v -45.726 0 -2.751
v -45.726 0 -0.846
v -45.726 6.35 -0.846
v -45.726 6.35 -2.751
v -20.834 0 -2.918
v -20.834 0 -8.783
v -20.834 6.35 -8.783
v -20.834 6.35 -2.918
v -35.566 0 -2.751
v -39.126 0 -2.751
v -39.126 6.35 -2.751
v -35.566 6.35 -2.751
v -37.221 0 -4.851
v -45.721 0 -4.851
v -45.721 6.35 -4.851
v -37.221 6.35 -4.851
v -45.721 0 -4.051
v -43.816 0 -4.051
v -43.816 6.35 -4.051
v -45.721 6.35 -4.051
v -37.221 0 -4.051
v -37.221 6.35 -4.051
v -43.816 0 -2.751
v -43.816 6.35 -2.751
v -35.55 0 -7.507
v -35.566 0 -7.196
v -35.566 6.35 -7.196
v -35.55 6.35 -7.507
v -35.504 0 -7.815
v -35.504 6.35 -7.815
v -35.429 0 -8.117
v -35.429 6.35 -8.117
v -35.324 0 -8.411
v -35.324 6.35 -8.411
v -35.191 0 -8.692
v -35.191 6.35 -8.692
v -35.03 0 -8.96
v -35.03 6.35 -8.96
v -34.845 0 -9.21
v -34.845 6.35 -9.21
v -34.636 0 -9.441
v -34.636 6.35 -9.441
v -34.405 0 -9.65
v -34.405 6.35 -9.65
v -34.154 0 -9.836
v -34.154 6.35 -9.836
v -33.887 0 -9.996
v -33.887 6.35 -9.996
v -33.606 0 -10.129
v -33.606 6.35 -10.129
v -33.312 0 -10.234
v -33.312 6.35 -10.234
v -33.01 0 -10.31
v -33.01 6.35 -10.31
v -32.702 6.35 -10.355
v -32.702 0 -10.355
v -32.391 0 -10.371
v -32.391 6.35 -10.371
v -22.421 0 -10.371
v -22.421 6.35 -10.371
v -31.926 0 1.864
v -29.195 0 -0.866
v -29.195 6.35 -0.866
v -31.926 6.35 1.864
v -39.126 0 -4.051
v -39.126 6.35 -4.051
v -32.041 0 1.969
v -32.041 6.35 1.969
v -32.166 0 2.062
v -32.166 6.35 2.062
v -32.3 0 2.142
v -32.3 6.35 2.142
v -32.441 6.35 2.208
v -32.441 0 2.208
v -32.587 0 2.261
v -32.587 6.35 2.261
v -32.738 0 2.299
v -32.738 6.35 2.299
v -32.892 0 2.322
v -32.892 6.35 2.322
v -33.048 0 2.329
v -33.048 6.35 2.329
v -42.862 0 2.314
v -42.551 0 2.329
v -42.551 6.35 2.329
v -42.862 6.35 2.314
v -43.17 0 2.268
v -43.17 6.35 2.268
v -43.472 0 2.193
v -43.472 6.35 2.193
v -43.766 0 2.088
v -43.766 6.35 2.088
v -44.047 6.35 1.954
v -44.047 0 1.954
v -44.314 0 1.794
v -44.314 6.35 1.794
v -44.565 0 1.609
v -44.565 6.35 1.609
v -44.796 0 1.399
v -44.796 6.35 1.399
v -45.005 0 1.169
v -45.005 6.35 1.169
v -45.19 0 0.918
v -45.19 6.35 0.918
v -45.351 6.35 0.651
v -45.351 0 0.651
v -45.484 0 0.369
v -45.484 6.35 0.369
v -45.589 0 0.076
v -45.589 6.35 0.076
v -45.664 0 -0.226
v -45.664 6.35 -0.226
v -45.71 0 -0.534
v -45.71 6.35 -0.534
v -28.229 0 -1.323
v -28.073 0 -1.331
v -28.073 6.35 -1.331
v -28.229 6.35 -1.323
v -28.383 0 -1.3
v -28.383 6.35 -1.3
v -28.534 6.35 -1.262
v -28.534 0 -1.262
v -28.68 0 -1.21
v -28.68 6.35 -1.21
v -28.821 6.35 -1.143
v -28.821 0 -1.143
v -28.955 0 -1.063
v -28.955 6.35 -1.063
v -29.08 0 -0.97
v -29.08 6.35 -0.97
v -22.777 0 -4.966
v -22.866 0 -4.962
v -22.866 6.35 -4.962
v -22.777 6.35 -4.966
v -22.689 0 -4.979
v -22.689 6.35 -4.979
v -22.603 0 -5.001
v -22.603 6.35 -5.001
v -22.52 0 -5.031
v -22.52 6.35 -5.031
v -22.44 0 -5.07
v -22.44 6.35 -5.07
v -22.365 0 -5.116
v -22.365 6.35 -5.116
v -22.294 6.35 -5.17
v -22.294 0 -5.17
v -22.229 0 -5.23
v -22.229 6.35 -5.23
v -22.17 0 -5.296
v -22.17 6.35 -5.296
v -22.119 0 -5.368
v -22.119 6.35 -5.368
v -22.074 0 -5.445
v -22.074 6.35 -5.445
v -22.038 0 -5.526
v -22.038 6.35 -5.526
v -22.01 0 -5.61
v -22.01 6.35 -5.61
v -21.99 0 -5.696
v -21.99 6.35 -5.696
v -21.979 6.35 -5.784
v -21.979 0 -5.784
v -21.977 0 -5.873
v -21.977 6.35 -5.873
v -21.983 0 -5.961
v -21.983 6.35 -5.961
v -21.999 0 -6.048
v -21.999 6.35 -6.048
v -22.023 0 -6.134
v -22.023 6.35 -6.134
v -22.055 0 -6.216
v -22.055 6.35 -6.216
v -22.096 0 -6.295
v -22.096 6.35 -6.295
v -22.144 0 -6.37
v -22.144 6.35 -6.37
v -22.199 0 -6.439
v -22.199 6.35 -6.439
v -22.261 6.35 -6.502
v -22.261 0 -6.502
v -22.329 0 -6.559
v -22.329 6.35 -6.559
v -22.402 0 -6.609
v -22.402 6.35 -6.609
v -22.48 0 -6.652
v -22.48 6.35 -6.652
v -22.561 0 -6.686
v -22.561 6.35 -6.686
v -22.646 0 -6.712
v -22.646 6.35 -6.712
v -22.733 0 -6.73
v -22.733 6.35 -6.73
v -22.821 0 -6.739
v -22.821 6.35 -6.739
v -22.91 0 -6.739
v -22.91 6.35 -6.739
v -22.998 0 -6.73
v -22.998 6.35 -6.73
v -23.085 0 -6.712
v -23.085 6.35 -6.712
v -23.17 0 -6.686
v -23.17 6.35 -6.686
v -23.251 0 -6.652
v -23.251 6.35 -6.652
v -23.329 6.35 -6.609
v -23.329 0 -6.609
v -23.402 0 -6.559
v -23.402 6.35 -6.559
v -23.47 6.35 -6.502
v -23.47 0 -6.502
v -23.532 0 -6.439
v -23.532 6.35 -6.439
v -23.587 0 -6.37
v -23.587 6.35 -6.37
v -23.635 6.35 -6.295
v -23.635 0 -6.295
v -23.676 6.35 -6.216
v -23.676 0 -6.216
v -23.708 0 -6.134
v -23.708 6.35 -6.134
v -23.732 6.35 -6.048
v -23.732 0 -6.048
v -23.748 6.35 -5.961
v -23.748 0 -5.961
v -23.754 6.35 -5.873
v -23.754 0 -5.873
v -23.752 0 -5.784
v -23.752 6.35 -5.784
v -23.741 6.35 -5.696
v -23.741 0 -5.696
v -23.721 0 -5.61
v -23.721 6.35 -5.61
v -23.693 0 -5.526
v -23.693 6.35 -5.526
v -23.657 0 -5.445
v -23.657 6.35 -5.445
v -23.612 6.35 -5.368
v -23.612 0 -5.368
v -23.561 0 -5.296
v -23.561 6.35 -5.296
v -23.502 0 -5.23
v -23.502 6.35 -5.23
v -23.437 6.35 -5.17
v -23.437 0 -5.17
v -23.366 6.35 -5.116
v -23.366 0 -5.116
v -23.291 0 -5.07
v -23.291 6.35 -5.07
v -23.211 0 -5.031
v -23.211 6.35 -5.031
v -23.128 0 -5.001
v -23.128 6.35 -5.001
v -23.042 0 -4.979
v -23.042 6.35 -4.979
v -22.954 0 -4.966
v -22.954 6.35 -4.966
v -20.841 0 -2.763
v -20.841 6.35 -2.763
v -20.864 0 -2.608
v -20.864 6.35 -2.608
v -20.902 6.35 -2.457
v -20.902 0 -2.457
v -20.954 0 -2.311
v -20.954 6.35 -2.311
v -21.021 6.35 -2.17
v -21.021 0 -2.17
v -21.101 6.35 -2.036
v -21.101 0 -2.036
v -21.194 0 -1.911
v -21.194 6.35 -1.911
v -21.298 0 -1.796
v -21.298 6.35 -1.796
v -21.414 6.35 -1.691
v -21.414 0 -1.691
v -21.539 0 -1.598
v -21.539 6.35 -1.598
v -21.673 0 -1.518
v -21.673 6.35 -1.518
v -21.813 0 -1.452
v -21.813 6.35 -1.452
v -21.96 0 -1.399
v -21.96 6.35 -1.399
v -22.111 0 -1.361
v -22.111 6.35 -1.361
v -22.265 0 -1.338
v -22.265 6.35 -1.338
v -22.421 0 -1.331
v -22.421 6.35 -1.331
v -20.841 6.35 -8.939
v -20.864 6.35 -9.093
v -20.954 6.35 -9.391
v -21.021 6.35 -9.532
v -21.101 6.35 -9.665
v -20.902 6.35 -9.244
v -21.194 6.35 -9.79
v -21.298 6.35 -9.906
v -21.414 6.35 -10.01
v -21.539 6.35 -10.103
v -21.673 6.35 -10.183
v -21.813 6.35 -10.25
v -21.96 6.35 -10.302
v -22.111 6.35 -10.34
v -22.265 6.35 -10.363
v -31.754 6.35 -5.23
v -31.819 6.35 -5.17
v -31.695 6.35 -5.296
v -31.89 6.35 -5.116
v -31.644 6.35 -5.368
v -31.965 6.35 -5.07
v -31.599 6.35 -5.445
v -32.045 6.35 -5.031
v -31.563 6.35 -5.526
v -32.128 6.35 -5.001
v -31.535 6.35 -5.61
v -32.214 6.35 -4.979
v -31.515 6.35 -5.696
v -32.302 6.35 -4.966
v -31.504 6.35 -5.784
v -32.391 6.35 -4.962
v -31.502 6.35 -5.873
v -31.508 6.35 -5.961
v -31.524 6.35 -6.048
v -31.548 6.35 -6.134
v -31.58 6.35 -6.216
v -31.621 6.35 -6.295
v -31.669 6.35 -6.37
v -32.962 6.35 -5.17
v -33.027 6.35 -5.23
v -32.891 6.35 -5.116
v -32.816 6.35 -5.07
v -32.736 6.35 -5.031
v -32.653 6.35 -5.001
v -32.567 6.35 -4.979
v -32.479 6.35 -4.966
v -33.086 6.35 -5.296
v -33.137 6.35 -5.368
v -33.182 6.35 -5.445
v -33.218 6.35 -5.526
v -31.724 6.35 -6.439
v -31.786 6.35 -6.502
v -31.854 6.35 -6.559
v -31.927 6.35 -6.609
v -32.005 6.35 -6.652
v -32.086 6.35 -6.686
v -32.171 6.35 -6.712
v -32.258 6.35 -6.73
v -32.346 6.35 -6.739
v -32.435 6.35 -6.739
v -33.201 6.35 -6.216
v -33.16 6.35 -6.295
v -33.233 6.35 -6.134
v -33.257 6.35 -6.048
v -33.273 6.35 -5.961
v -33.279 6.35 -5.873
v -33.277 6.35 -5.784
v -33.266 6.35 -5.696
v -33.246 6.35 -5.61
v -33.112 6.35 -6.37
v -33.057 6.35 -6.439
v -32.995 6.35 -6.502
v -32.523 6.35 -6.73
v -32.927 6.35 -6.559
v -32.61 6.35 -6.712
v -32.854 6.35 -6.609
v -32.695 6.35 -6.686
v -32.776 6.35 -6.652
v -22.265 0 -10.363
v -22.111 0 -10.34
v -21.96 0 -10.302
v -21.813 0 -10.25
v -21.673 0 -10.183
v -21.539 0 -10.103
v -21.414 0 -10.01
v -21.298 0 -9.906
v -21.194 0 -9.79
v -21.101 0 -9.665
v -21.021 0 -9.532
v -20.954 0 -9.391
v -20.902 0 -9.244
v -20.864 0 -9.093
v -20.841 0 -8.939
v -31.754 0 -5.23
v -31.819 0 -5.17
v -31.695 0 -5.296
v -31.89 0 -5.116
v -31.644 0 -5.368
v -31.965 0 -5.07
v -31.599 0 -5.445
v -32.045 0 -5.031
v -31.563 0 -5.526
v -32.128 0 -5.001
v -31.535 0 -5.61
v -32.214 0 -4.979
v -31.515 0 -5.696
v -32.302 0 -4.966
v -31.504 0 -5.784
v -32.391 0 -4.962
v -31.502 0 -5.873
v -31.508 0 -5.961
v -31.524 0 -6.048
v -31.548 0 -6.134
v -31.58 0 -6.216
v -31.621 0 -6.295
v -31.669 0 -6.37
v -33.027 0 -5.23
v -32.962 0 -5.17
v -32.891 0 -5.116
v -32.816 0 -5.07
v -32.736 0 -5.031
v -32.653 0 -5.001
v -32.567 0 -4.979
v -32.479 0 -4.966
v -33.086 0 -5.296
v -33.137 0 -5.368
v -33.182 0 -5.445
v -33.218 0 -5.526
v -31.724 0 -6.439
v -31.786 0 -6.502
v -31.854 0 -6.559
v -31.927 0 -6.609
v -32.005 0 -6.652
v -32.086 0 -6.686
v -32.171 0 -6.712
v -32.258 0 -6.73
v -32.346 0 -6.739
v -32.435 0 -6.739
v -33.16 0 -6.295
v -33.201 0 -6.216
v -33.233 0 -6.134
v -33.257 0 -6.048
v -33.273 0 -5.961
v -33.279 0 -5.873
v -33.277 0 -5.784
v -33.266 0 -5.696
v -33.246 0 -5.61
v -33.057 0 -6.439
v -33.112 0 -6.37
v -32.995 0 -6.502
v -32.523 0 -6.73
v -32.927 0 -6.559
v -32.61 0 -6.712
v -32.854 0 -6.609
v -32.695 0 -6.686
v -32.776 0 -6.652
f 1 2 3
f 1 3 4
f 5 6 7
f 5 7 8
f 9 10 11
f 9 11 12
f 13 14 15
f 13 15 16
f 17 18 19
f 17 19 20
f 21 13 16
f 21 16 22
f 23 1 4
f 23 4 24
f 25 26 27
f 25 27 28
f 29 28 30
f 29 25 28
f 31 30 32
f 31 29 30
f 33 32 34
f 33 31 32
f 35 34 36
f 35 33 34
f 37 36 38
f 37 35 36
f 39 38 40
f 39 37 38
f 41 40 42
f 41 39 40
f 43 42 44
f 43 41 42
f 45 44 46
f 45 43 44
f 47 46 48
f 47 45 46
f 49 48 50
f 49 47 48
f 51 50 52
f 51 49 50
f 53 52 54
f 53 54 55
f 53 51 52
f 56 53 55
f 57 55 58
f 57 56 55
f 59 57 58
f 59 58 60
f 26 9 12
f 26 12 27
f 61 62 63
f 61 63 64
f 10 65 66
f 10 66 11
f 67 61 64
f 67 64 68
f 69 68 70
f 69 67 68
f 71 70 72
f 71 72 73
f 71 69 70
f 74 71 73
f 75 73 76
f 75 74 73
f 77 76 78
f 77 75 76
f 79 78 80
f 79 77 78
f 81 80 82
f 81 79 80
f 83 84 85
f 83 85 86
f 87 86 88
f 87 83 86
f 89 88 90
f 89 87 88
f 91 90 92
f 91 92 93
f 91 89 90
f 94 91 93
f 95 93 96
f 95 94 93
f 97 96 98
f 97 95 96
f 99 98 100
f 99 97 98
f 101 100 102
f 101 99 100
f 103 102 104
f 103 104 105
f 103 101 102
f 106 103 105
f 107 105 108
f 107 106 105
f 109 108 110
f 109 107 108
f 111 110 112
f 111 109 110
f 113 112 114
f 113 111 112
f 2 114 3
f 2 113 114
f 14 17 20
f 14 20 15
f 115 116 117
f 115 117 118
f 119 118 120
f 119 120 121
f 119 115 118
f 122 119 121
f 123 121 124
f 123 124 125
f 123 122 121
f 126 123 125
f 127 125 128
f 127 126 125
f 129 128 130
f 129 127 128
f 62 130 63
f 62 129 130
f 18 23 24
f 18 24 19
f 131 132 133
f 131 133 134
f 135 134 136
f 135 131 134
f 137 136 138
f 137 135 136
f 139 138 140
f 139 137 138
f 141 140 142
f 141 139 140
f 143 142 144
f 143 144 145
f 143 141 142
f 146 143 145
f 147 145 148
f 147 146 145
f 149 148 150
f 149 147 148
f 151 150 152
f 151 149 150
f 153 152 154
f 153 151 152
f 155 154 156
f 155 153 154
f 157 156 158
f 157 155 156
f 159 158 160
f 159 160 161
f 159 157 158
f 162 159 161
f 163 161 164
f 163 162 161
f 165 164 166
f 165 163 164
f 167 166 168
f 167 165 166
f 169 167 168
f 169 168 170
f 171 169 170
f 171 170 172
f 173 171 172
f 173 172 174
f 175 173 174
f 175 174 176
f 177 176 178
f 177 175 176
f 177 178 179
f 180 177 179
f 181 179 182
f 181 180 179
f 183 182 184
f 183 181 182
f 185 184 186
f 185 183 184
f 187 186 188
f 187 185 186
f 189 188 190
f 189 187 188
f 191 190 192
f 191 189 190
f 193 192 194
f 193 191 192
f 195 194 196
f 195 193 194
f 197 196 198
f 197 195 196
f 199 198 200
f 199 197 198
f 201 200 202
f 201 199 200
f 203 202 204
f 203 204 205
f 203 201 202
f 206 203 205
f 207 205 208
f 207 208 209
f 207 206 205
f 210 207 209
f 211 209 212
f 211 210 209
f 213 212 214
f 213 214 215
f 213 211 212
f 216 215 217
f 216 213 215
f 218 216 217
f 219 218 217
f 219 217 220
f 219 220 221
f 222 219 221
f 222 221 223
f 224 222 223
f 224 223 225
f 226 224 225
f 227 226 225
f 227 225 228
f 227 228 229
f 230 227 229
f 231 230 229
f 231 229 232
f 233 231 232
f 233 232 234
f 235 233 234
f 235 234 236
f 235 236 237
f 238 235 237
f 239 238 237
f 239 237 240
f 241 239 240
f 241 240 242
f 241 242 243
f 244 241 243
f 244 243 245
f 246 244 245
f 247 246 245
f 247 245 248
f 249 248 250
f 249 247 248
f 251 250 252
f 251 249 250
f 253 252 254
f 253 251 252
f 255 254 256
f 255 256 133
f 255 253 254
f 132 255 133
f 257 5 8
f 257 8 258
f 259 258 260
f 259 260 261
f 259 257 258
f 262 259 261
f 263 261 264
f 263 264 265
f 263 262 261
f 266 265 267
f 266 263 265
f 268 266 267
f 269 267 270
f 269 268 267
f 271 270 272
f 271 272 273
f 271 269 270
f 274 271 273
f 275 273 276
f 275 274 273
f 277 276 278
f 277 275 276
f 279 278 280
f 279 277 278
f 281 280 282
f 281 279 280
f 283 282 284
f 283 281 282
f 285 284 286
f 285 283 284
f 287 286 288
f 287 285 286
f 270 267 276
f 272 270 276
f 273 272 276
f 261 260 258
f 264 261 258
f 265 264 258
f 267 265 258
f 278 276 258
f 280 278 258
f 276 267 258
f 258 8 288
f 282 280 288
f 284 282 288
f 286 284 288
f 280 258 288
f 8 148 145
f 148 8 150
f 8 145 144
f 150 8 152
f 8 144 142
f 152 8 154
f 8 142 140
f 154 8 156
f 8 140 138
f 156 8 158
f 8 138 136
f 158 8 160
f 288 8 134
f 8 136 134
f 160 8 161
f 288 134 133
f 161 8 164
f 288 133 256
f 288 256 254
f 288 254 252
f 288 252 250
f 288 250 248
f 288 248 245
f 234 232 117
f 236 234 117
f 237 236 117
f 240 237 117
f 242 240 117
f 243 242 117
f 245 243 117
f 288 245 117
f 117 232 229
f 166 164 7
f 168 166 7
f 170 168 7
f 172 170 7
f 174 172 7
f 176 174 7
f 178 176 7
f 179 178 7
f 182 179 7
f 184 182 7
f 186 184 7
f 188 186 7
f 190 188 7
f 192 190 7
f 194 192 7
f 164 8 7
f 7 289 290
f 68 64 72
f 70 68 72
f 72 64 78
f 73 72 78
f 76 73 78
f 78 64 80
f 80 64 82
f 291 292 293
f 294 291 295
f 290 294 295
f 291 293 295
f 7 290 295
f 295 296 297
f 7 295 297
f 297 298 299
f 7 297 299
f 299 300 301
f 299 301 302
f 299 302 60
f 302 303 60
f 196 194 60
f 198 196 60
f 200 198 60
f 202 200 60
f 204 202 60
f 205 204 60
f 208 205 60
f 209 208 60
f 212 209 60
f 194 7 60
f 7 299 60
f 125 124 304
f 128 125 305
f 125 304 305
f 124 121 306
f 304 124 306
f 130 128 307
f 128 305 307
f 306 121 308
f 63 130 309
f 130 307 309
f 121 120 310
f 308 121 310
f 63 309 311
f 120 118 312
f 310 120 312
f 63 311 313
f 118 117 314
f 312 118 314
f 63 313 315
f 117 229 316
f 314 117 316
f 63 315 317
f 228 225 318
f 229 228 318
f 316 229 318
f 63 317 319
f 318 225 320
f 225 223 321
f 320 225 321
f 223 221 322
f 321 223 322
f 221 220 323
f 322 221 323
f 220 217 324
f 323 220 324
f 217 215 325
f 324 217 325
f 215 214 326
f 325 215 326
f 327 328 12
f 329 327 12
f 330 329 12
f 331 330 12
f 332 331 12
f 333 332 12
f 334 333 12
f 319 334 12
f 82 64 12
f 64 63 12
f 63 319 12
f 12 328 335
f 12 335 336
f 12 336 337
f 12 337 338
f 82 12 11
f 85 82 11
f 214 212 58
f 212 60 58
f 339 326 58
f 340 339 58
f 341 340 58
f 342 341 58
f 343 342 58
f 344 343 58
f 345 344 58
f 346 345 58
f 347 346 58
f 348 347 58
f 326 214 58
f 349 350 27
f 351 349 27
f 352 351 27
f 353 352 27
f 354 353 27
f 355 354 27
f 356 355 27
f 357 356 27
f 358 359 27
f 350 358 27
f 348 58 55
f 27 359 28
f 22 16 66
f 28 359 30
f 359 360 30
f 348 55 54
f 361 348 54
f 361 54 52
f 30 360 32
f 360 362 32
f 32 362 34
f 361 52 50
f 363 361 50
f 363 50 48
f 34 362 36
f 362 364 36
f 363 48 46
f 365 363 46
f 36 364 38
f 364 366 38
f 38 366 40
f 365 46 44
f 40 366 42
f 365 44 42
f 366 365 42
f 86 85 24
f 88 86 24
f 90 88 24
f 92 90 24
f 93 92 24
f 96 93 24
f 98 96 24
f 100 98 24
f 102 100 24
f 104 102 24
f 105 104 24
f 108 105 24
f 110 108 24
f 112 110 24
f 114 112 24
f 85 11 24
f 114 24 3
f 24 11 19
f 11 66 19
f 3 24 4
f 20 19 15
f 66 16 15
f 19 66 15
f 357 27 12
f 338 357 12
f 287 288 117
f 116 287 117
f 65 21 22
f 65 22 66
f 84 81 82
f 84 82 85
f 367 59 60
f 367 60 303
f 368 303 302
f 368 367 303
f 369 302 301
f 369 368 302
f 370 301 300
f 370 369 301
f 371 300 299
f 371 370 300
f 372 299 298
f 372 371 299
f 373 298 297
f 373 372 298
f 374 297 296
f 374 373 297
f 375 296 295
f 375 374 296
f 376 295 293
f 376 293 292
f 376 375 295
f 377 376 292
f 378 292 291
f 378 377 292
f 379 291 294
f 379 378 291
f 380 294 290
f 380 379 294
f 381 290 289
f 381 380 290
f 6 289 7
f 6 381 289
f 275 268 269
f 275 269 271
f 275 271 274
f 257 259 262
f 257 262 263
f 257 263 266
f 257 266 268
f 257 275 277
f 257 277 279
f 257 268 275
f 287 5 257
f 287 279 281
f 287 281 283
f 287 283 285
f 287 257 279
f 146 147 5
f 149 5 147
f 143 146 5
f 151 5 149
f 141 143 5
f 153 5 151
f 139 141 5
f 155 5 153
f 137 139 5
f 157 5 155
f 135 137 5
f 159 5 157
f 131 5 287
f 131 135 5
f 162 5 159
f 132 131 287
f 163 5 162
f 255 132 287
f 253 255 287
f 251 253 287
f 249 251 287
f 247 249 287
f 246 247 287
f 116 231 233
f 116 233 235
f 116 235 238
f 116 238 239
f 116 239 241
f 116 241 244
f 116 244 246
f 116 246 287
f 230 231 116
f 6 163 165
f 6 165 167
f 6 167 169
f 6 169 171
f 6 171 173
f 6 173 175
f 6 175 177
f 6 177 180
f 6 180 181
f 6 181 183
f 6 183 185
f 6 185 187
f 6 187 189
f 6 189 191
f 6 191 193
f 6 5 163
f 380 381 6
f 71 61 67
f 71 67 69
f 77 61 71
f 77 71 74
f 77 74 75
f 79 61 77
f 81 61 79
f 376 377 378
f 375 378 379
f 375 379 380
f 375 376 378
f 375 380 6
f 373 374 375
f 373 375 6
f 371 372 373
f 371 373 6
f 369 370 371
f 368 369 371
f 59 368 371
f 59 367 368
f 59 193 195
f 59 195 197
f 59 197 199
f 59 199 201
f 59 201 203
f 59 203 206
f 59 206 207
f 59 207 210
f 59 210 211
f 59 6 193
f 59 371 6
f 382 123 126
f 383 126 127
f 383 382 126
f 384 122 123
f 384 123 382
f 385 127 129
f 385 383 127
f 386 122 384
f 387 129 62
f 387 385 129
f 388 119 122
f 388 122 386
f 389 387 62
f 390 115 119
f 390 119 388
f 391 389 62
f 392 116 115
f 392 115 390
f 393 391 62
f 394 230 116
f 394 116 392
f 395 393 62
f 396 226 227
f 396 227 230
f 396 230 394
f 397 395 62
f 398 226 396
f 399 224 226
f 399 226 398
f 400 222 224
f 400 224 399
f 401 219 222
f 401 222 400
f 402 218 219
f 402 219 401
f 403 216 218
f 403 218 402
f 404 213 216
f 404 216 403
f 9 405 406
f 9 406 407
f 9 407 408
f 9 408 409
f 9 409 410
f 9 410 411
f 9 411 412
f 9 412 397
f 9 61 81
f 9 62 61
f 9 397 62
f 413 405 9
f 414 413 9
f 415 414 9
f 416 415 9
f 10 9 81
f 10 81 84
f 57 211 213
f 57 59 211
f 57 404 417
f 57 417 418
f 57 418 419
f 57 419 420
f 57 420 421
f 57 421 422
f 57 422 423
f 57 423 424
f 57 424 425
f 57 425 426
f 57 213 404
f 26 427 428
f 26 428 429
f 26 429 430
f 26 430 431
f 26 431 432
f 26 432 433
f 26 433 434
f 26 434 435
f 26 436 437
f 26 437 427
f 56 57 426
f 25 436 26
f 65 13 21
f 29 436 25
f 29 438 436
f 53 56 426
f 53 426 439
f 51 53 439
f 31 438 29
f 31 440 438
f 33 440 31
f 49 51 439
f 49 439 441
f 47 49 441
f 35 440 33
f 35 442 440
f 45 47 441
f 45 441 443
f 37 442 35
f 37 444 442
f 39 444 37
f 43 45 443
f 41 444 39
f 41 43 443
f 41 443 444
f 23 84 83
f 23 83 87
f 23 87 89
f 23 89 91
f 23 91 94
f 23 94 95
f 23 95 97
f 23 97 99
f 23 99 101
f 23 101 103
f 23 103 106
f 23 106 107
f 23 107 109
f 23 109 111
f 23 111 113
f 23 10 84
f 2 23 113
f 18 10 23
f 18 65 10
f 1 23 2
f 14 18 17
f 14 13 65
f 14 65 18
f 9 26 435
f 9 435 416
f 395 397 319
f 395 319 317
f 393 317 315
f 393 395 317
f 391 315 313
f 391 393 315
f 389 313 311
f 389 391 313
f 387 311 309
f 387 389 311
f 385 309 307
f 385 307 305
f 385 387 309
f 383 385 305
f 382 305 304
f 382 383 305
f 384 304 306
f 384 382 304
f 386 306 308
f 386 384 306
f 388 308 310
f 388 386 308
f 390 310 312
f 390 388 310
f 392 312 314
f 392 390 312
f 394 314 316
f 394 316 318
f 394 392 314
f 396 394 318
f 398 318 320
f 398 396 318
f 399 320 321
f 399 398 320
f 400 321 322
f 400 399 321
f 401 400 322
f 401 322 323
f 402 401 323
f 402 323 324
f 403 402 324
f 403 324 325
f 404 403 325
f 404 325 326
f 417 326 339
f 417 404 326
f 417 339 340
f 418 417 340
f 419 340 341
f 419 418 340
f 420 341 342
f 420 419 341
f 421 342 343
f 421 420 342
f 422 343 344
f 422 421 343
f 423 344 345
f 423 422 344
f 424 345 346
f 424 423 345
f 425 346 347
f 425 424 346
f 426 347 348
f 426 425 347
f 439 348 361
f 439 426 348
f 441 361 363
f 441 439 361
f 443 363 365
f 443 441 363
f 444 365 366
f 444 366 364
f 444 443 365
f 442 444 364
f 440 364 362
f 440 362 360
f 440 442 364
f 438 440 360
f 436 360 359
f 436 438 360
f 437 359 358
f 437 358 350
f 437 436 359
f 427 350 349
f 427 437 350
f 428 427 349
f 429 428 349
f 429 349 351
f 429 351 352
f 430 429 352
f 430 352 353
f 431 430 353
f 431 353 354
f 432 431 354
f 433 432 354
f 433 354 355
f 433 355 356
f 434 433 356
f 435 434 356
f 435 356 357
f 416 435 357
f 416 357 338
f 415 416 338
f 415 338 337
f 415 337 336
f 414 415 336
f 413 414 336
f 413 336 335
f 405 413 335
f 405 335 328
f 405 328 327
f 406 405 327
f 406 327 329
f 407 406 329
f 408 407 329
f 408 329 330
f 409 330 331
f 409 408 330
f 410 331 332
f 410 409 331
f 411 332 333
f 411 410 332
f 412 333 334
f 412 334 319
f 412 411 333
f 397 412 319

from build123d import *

# Parameters (mm, degrees)
SKETCH1_R           = 0.889
BOSS_EXTRUDE1_DEPTH = 6.35


with BuildPart() as part:
    # Sketch1 → Boss-Extrude1 (new body)
    with BuildSketch(Plane(origin=(0, 0, 0), x_dir=(1, 0, 0), z_dir=(0, 1, 0))):
        with BuildLine():
            Line((-32.390505008, 10.370660171), (-22.421005008, 10.370660171))
            ThreePointArc((-22.421005008, 10.370660171), (-21.298472993, 9.905692187), (-20.833505008, 8.783160171))
            Line((-20.833505008, 8.783160171), (-20.833505008, 2.918160067))
            ThreePointArc((-20.833505008, 2.918160067), (-21.298472993, 1.795628052), (-22.421005008, 1.330660067))
            Line((-22.421005008, 1.330660067), (-28.072941082, 1.330660067))
            ThreePointArc((-28.072941082, 1.330660067), (-28.680451031, 1.209818825), (-29.195473097, 0.865692083))
            Line((-29.195473097, 0.865692083), (-31.925537023, -1.864371844))
            ThreePointArc((-31.925537023, -1.864371844), (-32.440559089, -2.208498586), (-33.048069038, -2.329339829))
            Line((-33.048069038, -2.329339829), (-42.550505008, -2.329339829))
            ThreePointArc((-42.550505008, -2.329339829), (-44.795569038, -1.399403859), (-45.725505008, 0.845660171))
            Line((-45.725505008, 0.845660171), (-45.725505008, 2.750660171))
            Line((-45.725505008, 2.750660171), (-43.815505008, 2.750660171))
            Line((-43.815505008, 2.750660171), (-43.815505008, 4.050660171))
            Line((-43.815505008, 4.050660171), (-45.720505008, 4.050660171))
            Line((-45.720505008, 4.050660171), (-45.720505008, 4.850660171))
            Line((-45.720505008, 4.850660171), (-37.220505008, 4.850660171))
            Line((-37.220505008, 4.850660171), (-37.220505008, 4.050660171))
            Line((-37.220505008, 4.050660171), (-39.125505008, 4.050660171))
            Line((-39.125505008, 4.050660171), (-39.125505008, 2.750660171))
            Line((-39.125505008, 2.750660171), (-35.565505008, 2.750660171))
            Line((-35.565505008, 2.750660171), (-35.565505008, 7.195660171))
            ThreePointArc((-35.565505008, 7.195660171), (-34.635569038, 9.440724202), (-32.390505008, 10.370660171))
        make_face()
        with Locations(Location((-32.390505008, 5.850660171, 0), (0, 0, 270))):
            Circle(SKETCH1_R, mode=Mode.SUBTRACT)
        with Locations(Location((-22.865505008, 5.850660171, 0), (0, 0, 270))):
            Circle(SKETCH1_R, mode=Mode.SUBTRACT)
    extrude(amount=BOSS_EXTRUDE1_DEPTH)


solid = part.part
